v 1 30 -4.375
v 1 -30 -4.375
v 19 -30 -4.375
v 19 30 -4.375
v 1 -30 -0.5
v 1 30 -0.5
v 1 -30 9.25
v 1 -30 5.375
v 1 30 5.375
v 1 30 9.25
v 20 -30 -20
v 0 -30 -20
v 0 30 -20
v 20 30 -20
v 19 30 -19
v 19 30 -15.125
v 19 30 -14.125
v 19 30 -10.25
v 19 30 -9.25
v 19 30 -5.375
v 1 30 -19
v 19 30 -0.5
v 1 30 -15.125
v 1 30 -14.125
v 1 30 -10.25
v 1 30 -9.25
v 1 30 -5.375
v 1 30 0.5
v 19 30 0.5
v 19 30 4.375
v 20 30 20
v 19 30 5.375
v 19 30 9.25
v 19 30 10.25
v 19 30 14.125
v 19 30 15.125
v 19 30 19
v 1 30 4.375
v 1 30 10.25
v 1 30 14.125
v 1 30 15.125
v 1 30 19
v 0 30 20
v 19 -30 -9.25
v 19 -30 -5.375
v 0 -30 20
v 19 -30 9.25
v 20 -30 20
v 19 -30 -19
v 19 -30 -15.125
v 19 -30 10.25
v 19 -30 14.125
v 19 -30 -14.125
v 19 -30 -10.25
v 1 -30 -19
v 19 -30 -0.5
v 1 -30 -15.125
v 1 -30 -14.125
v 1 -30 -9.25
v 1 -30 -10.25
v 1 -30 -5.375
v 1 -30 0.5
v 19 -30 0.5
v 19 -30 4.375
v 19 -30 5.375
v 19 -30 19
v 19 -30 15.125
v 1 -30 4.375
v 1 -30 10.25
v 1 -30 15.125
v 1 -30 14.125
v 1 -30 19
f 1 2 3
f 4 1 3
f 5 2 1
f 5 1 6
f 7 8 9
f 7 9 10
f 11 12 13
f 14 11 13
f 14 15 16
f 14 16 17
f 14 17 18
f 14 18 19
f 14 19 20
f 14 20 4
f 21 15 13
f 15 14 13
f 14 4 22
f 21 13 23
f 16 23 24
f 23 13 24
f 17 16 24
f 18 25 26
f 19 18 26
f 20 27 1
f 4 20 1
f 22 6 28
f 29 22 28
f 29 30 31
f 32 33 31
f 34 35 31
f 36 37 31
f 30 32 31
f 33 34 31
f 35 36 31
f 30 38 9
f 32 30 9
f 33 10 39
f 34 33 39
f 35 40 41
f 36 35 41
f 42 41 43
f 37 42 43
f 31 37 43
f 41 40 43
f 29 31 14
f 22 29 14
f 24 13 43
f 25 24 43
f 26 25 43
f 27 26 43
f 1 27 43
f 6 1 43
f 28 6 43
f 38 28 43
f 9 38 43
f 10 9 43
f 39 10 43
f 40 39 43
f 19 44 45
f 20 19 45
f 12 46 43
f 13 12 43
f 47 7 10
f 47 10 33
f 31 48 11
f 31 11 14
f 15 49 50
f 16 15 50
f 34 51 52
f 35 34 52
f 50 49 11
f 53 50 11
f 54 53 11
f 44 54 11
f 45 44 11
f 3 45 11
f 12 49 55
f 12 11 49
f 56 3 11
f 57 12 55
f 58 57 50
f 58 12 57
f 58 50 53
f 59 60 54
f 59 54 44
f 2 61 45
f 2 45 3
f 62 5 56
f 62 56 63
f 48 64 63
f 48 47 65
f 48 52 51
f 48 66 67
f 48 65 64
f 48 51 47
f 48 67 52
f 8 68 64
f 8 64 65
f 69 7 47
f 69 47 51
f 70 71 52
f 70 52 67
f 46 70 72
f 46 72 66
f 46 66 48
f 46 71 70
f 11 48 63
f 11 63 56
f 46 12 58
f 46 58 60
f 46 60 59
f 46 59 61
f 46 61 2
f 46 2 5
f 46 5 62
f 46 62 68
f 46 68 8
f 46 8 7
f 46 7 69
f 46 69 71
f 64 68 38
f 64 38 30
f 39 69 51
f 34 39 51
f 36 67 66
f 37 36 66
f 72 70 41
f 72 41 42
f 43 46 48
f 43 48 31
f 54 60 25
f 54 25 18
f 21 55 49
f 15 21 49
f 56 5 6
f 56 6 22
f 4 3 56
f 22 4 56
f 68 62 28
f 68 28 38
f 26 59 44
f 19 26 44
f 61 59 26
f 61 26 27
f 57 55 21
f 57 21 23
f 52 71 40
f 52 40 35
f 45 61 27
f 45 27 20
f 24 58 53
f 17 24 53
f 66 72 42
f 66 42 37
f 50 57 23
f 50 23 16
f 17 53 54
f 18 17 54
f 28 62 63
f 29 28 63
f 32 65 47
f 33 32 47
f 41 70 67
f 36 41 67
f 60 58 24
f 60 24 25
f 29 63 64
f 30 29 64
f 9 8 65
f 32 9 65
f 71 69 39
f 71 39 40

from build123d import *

# Parameters (mm, degrees)
ESQUISSE1_W             = 60
ESQUISSE1_H             = 40
BOSS_EXTRU_1_DEPTH      = 20
ESQUISSE2_W             = 18
ESQUISSE2_H             = 3.875
ENL_V_MAT_EXTRU_1_DEPTH = 67.332495807


with BuildPart() as part:
    # Esquisse1 → Boss.-Extru.1 (new body)
    with BuildSketch(Plane.YZ):
        Rectangle(ESQUISSE1_W, ESQUISSE1_H)
    extrude(amount=BOSS_EXTRU_1_DEPTH)

    # Esquisse2 → Enlèv. mat.-Extru.1 (cut, through all)
    with BuildSketch(Plane.XZ.offset(30)):
        with Locations((10, 17.0625)):
            Rectangle(ESQUISSE2_W, ESQUISSE2_H)
        with Locations((10, 12.1875)):
            Rectangle(ESQUISSE2_W, ESQUISSE2_H)
        with Locations((10, 7.3125)):
            Rectangle(ESQUISSE2_W, ESQUISSE2_H)
        with Locations((10, 2.4375)):
            Rectangle(ESQUISSE2_W, ESQUISSE2_H)
        with Locations((10, -2.4375)):
            Rectangle(ESQUISSE2_W, ESQUISSE2_H)
        with Locations((10, -7.3125)):
            Rectangle(ESQUISSE2_W, ESQUISSE2_H)
        with Locations((10, -12.1875)):
            Rectangle(ESQUISSE2_W, ESQUISSE2_H)
        with Locations((10, -17.0625)):
            Rectangle(ESQUISSE2_W, ESQUISSE2_H)
    extrude(amount=-ENL_V_MAT_EXTRU_1_DEPTH, mode=Mode.SUBTRACT)


solid = part.part
